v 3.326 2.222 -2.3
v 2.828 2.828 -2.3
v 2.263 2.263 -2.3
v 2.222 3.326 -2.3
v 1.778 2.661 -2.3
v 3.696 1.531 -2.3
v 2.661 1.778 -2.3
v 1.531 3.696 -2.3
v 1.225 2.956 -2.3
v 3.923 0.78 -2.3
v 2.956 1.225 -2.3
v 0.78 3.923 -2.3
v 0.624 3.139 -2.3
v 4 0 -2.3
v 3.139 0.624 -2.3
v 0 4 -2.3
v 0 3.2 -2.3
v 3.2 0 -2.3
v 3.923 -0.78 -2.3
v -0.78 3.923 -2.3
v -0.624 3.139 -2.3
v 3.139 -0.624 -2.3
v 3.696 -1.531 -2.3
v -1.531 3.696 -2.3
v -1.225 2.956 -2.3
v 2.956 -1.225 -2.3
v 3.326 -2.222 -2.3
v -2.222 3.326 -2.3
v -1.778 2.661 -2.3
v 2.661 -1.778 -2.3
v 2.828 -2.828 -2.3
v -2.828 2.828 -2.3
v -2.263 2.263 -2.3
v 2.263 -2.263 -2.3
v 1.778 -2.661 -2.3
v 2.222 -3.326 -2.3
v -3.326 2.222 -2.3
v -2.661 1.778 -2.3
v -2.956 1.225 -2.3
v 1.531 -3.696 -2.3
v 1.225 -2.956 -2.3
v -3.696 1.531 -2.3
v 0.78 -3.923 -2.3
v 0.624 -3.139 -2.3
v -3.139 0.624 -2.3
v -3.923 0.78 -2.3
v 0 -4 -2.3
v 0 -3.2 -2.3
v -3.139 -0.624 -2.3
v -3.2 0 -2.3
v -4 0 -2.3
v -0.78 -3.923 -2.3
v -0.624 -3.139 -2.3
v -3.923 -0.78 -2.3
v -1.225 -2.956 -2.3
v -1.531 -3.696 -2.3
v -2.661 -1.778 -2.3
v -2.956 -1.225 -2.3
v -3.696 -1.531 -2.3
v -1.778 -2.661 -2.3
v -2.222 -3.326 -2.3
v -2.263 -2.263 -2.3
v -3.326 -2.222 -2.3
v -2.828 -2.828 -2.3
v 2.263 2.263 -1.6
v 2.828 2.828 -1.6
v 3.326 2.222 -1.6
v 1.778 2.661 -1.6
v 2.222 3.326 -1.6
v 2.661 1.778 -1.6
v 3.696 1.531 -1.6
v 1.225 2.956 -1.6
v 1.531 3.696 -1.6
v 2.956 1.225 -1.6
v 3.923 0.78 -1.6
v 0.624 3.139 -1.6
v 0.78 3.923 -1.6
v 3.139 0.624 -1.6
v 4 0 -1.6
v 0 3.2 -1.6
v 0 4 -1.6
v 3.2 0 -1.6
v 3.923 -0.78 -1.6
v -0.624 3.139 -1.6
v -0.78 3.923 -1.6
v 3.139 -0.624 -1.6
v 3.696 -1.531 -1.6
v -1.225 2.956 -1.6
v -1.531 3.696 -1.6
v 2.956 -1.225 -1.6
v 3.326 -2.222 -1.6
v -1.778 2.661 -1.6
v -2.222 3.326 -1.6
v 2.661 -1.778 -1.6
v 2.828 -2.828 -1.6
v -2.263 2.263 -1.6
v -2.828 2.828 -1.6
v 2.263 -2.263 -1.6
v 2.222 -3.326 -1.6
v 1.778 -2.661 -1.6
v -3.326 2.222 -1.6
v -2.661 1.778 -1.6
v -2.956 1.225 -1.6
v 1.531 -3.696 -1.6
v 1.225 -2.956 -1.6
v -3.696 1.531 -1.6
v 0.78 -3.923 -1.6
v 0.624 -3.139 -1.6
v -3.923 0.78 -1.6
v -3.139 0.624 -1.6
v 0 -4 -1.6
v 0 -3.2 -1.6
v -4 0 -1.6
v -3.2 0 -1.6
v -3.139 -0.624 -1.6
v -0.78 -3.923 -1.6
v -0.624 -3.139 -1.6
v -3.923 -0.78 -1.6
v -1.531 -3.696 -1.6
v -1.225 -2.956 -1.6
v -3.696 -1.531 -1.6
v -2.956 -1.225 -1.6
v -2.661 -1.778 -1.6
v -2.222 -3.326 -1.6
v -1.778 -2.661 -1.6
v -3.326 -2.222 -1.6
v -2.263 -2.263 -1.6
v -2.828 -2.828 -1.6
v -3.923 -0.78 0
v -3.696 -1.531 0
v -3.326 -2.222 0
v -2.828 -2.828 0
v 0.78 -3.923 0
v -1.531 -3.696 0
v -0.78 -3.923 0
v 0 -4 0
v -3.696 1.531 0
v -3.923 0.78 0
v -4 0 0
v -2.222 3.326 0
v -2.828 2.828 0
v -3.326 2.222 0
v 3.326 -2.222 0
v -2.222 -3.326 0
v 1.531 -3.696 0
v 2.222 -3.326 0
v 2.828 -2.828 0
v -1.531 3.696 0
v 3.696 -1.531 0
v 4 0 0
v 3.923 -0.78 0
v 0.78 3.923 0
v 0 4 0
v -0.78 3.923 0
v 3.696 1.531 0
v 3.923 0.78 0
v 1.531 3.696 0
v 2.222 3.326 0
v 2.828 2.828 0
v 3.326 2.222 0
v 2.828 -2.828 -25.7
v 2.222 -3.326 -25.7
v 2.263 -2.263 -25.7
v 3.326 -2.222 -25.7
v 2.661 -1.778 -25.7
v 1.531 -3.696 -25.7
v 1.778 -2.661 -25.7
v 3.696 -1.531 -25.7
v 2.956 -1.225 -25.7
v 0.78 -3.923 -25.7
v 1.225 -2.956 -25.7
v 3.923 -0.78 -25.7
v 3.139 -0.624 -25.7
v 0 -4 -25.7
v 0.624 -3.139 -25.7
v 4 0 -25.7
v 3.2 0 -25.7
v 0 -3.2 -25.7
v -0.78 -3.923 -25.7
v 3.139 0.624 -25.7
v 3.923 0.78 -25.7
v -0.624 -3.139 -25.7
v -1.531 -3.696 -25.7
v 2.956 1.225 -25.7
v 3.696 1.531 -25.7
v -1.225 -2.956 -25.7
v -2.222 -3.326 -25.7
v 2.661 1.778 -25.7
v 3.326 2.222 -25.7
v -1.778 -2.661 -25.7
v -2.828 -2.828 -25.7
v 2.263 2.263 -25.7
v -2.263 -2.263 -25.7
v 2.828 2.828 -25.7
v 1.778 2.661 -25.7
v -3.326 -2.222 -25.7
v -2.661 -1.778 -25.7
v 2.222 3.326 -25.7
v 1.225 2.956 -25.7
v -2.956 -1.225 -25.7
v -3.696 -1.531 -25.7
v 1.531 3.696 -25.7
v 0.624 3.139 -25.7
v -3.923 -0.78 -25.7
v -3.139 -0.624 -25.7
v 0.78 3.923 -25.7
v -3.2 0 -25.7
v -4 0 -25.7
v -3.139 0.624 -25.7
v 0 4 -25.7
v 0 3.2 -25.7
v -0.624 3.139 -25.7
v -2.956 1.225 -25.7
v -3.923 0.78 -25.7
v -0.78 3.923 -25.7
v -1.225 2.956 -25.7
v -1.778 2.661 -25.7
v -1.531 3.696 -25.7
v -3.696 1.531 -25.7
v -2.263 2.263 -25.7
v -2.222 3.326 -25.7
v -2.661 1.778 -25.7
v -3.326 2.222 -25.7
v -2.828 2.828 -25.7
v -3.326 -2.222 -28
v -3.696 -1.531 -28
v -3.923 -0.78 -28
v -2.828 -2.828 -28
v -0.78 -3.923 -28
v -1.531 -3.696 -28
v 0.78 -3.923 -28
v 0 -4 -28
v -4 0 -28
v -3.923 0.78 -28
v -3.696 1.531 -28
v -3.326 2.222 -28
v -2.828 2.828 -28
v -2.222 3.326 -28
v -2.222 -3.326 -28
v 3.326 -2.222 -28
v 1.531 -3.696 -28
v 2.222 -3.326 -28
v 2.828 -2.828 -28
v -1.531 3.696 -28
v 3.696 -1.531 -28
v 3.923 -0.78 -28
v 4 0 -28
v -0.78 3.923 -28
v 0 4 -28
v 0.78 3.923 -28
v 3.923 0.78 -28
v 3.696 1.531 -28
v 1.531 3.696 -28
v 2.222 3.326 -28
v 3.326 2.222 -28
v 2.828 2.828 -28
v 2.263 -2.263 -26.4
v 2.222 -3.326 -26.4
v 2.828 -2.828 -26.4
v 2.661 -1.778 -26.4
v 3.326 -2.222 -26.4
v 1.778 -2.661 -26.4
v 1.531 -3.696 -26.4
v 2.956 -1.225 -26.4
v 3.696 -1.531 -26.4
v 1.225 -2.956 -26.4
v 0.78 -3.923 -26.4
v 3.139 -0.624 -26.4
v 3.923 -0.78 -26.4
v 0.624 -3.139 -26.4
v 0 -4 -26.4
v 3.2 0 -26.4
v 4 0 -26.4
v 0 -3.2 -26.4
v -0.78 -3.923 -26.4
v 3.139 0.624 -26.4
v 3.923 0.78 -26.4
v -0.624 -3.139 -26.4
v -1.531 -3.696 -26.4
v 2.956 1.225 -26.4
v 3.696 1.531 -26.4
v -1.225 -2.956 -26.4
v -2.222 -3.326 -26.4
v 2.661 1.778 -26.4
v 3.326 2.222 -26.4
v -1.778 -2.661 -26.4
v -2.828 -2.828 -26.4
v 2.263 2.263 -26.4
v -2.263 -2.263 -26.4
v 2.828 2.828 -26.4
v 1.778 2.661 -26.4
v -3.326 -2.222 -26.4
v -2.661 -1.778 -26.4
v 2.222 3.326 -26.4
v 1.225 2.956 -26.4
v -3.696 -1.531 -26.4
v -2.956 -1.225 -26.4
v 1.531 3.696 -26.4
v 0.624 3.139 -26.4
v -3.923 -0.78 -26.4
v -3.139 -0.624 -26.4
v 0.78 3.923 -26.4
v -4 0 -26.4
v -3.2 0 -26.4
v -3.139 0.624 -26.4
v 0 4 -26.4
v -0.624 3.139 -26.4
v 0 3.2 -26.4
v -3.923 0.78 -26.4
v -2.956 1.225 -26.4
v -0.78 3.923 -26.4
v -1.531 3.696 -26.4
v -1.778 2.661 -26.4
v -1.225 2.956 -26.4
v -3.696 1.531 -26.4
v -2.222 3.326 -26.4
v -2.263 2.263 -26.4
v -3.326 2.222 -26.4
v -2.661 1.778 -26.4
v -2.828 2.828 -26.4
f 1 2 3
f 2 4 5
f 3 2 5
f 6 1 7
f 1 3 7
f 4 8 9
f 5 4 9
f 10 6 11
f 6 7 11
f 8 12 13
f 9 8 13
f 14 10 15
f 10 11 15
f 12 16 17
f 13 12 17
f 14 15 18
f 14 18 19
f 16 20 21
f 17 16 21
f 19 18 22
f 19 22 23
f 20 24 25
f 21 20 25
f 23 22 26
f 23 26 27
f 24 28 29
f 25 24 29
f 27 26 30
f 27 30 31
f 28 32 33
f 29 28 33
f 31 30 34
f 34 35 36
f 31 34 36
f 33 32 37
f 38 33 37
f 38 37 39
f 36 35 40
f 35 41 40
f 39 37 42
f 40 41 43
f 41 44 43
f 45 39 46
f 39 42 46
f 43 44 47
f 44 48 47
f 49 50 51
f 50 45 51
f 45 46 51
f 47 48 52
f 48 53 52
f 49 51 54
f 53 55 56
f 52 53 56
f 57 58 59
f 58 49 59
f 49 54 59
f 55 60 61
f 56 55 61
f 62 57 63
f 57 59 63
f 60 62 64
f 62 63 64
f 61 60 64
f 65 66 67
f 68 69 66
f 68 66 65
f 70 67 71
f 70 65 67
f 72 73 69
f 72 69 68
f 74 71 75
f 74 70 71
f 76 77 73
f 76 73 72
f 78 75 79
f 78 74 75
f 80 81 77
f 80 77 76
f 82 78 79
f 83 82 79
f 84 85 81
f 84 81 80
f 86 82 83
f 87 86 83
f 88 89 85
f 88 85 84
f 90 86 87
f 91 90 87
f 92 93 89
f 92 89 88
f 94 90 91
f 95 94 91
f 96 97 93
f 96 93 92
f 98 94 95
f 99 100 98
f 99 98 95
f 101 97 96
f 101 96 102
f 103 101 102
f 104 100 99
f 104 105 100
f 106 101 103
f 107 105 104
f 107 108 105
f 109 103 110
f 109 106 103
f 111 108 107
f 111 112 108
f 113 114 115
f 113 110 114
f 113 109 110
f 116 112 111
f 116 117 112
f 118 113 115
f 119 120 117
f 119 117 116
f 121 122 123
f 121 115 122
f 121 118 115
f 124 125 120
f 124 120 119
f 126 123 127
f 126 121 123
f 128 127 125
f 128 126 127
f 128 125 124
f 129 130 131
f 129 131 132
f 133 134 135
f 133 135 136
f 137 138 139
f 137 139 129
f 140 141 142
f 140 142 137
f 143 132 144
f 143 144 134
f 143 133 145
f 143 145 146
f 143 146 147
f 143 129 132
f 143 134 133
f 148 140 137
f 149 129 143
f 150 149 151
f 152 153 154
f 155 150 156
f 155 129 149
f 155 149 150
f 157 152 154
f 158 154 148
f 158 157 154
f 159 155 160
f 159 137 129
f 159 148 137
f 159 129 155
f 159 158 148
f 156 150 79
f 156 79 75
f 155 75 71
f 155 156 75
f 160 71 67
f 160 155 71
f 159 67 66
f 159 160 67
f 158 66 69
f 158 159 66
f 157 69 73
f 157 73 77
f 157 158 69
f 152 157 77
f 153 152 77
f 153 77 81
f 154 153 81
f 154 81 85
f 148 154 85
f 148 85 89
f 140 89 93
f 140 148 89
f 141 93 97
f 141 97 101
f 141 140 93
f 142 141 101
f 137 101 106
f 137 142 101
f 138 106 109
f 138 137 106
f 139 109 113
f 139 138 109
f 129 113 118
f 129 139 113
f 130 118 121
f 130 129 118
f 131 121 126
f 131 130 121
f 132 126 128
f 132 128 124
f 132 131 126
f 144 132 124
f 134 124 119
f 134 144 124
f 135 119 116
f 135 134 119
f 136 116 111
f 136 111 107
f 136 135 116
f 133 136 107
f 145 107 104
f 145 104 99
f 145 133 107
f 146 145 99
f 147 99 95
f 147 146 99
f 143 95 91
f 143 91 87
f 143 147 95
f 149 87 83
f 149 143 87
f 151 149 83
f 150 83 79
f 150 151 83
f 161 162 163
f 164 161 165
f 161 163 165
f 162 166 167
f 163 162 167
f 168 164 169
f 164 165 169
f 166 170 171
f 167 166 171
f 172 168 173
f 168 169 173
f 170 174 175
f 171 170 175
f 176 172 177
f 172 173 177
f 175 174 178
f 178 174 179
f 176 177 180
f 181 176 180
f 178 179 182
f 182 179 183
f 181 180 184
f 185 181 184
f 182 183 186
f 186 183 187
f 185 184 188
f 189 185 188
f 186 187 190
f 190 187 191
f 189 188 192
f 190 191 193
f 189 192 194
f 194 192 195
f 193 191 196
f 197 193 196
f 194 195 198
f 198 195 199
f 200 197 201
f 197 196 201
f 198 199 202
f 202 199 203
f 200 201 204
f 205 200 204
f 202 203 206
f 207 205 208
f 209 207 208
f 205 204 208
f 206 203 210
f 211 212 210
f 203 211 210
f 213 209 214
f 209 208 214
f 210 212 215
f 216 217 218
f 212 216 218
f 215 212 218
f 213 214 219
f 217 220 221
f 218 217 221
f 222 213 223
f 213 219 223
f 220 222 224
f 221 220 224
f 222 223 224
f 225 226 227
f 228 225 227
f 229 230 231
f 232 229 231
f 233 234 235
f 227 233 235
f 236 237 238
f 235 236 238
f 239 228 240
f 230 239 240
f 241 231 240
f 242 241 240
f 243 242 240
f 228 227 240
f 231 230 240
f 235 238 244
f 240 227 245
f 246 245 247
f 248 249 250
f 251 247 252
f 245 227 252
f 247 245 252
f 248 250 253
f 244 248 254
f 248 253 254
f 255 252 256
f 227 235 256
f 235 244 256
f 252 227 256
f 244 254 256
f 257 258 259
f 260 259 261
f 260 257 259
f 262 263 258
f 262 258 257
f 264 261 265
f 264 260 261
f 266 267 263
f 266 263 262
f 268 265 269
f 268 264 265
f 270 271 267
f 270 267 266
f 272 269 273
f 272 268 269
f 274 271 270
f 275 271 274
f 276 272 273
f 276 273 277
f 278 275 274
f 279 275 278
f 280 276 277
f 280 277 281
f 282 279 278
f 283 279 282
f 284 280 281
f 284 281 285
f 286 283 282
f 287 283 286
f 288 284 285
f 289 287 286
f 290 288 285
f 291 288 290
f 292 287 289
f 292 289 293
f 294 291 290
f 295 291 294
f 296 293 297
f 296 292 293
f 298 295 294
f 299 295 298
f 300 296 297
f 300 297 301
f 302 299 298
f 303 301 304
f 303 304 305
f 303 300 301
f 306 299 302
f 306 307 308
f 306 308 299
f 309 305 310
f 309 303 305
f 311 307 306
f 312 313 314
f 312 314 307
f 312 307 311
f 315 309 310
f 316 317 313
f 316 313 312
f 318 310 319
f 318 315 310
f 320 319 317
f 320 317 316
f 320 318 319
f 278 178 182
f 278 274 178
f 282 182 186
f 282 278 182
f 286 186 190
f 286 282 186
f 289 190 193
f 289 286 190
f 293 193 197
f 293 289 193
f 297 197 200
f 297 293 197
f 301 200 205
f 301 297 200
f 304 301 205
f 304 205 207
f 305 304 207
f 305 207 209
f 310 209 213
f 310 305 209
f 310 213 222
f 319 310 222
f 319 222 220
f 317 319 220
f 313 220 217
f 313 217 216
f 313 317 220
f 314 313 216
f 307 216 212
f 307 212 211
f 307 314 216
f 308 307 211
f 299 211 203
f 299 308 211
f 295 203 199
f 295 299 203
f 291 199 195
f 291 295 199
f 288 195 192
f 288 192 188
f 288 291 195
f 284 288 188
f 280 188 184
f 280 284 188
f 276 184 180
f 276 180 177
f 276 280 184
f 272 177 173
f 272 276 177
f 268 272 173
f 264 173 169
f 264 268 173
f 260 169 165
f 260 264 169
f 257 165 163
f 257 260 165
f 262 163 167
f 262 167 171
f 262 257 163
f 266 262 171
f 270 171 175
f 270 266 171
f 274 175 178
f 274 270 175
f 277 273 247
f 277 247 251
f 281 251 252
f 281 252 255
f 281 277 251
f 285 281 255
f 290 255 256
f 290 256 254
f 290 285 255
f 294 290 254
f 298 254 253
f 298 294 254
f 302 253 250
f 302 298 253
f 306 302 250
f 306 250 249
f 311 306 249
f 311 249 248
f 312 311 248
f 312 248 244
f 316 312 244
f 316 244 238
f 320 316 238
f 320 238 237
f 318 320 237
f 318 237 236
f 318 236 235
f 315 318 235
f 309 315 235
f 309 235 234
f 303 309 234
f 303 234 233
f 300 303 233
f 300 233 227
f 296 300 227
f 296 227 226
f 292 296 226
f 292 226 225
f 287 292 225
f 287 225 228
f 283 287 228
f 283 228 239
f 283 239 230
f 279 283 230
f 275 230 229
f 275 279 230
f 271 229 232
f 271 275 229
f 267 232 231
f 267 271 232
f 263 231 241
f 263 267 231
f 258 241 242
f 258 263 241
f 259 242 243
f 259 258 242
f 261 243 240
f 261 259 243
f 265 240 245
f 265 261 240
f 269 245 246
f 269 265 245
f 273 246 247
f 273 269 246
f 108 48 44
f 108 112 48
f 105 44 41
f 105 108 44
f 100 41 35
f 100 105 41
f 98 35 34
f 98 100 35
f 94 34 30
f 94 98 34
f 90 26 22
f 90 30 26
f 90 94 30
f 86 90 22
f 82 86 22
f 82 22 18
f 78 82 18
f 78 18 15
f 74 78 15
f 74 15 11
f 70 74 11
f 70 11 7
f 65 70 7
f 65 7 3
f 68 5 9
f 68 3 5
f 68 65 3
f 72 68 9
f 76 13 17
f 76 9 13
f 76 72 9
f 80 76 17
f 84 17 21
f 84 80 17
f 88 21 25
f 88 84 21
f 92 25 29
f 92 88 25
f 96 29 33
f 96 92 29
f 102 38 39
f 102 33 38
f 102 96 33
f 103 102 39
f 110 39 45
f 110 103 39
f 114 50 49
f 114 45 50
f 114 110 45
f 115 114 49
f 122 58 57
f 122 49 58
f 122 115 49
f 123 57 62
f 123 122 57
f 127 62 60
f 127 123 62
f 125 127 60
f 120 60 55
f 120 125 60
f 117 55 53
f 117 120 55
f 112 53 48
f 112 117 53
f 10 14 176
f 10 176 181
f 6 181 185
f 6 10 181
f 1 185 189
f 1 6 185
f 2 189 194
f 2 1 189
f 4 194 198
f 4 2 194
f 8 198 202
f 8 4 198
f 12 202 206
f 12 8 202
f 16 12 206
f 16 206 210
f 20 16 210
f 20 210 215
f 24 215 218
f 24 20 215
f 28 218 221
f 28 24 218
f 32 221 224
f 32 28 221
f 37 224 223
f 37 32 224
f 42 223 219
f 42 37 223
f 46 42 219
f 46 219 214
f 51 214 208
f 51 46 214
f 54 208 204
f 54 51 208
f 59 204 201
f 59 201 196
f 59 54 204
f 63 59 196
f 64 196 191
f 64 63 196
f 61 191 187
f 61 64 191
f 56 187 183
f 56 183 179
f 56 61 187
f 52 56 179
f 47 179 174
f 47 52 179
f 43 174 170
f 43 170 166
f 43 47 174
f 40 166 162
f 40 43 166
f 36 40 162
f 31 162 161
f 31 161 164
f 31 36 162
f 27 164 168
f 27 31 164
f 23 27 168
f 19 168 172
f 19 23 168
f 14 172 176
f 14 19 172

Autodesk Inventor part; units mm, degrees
ref_plane "YZ Plane" through (0, 0, 0) normal (1, 0, 0) x (0, 1, 0)
ref_plane "XZ Plane" through (0, 0, 0) normal (0, 1, 0) x (-1, 0, 0)
sketch "Boceto1" plane through (0, 0, 0) normal (0, 0, 1) x (1, 0, 0)
  circle A0 centre (0, 0) radius 4
  dimension "d0" = 8
extrude "Extrusión1" add sketch "Boceto1" against normal blind 28
ref_plane "Plano de trabajo1" through (0, 0, -14) normal (0, 0, 1) x (1, 0, 0)
sketch "Boceto2" plane through (0, 0, 0) normal (1, 0, 0) x (0, 1, 0)
  line L0 (0, 0) -> (0, -1.6) construction
  line L1 (0, -1.6) -> (-4, -1.6) construction
  line L2 (-4, 0) -> (-4, -28) projected
  line L3 (-4, -1.6) -> (-4, -2.3)
  line L4 (-4, -2.3) -> (-3.2, -2.3)
  line L5 (-3.2, -2.3) -> (-3.2, -1.6)
  line L6 (-4, -1.6) -> (-3.2, -1.6)
  dimension "d3" = 1.6
  dimension "d4" = 0.7
  dimension "d5" = 0.8
revolve "Revolución1" cut sketch "Boceto2" angle 360 about axis through (0, 0, 0) along (0, 0, -1)
mirror "Simetría1" about plane through (0, 0, -14) normal (0, 0, 1) of "Revolución1"
properties part number "12_Pasador"
